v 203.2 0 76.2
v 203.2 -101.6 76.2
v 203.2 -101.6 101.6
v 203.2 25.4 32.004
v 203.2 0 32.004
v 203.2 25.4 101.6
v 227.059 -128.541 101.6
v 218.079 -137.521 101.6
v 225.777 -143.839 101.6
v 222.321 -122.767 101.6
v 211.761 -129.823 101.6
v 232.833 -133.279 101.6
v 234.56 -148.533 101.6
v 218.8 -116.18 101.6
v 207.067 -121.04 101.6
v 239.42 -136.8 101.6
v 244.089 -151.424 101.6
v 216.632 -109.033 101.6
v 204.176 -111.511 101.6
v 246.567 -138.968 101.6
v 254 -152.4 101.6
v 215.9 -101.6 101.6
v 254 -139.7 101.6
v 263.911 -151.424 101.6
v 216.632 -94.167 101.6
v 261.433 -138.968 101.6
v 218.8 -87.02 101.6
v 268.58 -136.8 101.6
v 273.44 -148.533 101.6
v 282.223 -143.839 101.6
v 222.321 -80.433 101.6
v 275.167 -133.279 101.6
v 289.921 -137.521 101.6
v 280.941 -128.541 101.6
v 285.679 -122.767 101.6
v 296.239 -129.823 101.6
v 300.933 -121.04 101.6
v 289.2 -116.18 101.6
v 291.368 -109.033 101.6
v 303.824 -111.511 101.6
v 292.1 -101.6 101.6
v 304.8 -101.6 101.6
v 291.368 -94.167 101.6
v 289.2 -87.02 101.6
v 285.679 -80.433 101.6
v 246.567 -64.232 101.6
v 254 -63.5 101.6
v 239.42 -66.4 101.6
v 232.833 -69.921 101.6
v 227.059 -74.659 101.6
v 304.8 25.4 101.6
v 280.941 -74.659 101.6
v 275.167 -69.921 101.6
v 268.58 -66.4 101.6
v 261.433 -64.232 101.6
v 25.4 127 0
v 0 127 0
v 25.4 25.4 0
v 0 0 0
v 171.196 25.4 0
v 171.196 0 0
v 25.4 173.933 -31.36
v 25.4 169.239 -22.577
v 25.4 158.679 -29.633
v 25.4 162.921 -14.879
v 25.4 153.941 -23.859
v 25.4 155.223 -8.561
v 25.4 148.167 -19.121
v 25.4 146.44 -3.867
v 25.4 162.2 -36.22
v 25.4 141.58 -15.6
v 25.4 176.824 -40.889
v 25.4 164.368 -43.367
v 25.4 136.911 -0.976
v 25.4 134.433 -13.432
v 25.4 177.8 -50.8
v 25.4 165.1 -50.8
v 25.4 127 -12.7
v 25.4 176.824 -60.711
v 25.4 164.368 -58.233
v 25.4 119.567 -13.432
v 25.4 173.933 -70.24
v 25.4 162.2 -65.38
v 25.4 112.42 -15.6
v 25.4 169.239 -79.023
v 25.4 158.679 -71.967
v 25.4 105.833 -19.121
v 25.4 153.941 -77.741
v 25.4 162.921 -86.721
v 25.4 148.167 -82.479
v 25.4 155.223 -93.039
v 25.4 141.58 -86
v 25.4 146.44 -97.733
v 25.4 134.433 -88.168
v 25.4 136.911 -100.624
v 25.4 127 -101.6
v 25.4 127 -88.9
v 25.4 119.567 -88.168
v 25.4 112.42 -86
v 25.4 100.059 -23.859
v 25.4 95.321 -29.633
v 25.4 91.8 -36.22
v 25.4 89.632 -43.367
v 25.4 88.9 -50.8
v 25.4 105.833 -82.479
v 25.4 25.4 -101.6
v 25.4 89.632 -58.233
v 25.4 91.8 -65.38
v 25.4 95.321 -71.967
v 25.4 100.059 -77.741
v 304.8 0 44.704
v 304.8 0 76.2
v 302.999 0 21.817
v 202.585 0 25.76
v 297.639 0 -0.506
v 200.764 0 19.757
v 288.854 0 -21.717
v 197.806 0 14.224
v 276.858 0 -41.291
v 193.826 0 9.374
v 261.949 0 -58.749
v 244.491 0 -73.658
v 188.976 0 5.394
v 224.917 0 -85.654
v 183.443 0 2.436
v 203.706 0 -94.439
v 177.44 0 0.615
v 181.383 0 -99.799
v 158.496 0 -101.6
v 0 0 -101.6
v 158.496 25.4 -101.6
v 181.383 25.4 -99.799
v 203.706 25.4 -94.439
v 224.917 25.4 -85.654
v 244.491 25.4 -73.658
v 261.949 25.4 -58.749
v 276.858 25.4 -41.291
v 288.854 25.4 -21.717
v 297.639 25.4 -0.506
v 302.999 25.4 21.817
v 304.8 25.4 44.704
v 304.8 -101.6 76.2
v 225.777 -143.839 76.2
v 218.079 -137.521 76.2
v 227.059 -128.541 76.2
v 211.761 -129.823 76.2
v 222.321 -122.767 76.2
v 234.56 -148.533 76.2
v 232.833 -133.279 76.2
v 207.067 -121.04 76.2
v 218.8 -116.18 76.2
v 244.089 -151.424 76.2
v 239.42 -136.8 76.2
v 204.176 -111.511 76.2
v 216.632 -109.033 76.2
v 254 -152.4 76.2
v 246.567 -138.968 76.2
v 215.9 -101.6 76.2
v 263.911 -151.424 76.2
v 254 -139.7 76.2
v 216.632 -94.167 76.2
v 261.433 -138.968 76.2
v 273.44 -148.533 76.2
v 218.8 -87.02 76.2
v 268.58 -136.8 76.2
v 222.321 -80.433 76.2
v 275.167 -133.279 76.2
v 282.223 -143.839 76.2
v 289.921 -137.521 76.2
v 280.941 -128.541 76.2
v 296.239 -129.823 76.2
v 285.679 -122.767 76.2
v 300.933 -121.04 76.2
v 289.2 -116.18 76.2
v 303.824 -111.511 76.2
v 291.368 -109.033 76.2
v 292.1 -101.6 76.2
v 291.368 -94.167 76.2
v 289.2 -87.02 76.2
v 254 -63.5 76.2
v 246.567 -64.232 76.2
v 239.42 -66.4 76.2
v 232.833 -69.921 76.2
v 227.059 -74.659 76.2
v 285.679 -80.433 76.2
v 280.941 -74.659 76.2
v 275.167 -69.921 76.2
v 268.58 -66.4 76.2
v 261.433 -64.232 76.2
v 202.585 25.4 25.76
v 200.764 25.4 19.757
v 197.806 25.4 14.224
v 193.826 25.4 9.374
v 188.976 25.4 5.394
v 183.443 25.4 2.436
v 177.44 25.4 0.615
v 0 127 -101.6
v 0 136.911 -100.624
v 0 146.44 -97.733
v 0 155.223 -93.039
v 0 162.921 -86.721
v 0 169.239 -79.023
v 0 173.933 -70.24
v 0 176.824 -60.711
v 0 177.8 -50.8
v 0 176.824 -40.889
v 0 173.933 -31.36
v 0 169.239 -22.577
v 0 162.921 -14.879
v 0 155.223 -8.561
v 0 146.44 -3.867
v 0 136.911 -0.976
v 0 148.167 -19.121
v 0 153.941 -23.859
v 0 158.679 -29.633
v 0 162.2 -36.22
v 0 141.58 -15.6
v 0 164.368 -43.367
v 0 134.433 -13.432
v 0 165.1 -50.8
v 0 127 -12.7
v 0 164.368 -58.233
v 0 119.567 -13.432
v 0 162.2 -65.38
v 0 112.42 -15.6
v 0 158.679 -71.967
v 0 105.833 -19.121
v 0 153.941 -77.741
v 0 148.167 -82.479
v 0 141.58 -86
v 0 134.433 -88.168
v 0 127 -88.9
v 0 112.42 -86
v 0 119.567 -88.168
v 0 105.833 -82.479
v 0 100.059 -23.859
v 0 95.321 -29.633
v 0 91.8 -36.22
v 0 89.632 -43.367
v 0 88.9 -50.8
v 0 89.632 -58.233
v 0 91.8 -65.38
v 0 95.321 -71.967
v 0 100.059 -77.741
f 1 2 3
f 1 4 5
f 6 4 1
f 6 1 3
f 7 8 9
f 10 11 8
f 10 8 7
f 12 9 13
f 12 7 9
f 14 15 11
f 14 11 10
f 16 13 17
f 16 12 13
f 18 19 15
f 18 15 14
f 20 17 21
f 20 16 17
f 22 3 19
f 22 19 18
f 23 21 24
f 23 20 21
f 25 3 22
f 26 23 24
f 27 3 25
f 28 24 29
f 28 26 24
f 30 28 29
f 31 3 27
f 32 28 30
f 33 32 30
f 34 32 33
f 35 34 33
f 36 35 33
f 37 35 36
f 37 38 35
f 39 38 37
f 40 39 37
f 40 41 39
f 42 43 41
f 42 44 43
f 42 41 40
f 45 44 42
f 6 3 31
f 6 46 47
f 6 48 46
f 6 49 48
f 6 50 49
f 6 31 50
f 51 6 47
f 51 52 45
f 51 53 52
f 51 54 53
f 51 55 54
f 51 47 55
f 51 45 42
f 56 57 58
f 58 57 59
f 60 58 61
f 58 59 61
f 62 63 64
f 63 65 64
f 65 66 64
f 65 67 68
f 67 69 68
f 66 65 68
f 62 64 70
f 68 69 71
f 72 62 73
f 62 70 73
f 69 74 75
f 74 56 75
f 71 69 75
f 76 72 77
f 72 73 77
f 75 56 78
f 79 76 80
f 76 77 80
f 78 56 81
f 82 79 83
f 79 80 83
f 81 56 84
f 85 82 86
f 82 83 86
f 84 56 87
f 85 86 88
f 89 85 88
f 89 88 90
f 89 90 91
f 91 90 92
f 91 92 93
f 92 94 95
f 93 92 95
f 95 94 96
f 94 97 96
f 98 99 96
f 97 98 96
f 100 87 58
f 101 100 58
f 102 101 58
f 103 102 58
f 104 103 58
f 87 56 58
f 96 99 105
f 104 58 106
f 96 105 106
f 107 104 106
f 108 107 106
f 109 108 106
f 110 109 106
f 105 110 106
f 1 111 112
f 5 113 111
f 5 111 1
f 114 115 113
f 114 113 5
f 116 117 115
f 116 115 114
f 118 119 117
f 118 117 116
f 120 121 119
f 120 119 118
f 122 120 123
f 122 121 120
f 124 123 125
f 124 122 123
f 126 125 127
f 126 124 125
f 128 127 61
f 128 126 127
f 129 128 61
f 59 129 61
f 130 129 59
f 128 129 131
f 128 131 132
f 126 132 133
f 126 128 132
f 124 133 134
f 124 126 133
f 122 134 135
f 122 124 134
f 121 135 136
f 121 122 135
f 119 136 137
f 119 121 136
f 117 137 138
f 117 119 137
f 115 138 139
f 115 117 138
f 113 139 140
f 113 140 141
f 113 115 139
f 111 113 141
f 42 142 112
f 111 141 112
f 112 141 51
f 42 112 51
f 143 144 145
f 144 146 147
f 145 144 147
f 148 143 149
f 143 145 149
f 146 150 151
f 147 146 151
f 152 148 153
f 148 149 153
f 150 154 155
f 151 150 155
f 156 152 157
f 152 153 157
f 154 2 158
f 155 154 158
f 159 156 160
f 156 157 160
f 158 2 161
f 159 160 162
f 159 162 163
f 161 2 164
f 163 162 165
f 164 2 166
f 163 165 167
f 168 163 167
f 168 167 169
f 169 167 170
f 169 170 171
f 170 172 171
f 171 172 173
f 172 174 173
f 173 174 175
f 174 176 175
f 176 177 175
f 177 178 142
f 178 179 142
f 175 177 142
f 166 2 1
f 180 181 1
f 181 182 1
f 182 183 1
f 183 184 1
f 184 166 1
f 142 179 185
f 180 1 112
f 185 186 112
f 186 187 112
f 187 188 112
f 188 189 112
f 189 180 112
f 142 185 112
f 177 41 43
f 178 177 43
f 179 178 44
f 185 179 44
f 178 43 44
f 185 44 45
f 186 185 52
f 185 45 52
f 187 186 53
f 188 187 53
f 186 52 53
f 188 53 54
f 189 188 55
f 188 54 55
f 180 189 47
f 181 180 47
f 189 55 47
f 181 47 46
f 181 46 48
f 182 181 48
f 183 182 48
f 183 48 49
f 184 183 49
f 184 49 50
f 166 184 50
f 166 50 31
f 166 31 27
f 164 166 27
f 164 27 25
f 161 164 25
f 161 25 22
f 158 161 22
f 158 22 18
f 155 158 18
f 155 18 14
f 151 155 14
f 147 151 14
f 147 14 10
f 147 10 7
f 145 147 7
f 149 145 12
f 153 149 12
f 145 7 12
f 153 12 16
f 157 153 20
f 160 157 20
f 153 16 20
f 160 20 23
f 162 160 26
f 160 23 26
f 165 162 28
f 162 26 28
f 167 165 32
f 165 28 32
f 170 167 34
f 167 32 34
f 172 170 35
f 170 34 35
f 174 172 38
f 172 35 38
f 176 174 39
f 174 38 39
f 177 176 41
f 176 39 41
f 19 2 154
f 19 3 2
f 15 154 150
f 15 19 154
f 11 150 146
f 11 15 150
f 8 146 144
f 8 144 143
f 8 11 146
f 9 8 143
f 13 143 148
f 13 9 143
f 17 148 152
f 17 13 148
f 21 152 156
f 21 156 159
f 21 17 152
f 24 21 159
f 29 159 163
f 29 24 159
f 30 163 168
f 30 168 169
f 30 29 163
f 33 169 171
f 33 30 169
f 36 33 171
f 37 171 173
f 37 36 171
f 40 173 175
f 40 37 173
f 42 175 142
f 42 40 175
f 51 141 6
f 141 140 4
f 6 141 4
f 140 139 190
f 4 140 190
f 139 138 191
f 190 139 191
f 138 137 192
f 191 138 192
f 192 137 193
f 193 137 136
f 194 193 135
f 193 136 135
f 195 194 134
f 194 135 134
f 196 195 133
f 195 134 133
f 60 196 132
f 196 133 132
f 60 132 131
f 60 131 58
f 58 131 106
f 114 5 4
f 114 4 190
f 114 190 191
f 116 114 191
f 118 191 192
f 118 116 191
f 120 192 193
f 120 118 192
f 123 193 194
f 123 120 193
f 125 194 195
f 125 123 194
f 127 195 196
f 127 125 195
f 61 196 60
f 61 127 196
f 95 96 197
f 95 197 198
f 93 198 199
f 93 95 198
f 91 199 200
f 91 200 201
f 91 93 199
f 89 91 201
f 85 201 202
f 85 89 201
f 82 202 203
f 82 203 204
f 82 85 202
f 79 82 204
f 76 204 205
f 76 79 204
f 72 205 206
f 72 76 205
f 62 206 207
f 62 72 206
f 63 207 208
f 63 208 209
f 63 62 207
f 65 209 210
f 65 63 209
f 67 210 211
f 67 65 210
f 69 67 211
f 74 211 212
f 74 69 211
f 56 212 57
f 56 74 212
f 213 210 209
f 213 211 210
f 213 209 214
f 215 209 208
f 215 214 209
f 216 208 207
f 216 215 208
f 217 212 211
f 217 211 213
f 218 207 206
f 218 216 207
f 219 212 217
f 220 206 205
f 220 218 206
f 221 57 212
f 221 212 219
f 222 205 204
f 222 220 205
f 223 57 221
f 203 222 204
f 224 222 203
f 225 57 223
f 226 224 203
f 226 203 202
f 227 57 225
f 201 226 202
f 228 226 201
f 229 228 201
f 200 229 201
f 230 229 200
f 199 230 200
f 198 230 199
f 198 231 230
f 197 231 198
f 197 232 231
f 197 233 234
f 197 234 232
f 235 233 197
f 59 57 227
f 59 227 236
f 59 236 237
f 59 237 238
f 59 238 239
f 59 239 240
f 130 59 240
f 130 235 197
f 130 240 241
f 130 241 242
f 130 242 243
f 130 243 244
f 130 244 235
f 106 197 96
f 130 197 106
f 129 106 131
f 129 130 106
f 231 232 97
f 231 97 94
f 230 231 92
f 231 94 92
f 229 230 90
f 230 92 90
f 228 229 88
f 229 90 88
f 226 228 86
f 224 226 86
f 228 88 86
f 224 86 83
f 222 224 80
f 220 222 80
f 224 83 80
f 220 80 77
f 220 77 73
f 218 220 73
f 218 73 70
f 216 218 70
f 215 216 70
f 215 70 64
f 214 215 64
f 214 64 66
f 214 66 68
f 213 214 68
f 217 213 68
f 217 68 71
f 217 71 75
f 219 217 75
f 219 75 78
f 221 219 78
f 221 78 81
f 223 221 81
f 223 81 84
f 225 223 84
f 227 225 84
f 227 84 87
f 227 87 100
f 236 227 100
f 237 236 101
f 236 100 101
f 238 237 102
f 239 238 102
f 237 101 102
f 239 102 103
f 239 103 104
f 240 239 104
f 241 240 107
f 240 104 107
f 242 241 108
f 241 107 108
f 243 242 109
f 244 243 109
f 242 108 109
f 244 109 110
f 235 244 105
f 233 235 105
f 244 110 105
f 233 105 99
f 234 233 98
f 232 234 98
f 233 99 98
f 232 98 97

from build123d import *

# Parameters (mm, degrees)
SALIENTE_EXTRUIR1_DEPTH = 25.4
CROQUIS2_W              = 101.6
CROQUIS2_H              = 25.4
SALIENTE_EXTRUIR2_DEPTH = 101.6
CROQUIS3_R              = 50.8
SALIENTE_EXTRUIR3_DEPTH = 25.4
CROQUIS4_R              = 38.1
CORTAR_EXTRUIR1_DEPTH   = 204.2
CROQUIS5_W              = 25.4
CROQUIS5_H              = 101.6
SALIENTE_EXTRUIR4_DEPTH = 101.6
CROQUIS6_R              = 50.8
SALIENTE_EXTRUIR5_DEPTH = 25.4
CROQUIS7_R              = 38.1
CORTAR_EXTRUIR3_DEPTH   = 26.4


with BuildPart() as part:
    # Croquis1 → Saliente-Extruir1 (new body)
    with BuildSketch(Plane(origin=(0, 0, 0), x_dir=(1, 0, 0), z_dir=(0, 1, 0))):
        with BuildLine():
            Line((0, 0), (0, 101.6))
            Line((0, 101.6), (158.496, 101.6))
            ThreePointArc((158.496, 101.6), (261.948550515, 58.748550515), (304.8, -44.704))
            Line((304.8, -44.704), (304.8, -101.6))
            Line((304.8, -101.6), (203.2, -101.6))
            Line((203.2, -101.6), (203.2, -32.004))
            ThreePointArc((203.2, -32.004), (193.826245425, -9.373754575), (171.196, 0))
            Line((171.196, 0), (0, 0))
        make_face()
    extrude(amount=SALIENTE_EXTRUIR1_DEPTH)

    # Croquis2 → Saliente-Extruir2 (add)
    with BuildSketch(Plane.XZ):
        with Locations((254, 88.9)):
            Rectangle(CROQUIS2_W, CROQUIS2_H)
    extrude(amount=SALIENTE_EXTRUIR2_DEPTH)

    # Croquis3 → Saliente-Extruir3 (add)
    with BuildSketch(Plane.XY.offset(101.6)):
        with Locations((254, -101.6)):
            Circle(CROQUIS3_R)
    extrude(amount=-SALIENTE_EXTRUIR3_DEPTH)

    # Croquis4 → Cortar-Extruir1 (cut, through all)
    with BuildSketch(Plane.XY.offset(101.6)):
        with Locations((254, -101.6)):
            Circle(CROQUIS4_R)
    extrude(amount=-CORTAR_EXTRUIR1_DEPTH, mode=Mode.SUBTRACT)

    # Croquis5 → Saliente-Extruir4 (add)
    with BuildSketch(Plane(origin=(0, 25.4, 0), x_dir=(1, 0, 0), z_dir=(0, 1, 0))):
        with Locations((12.7, 50.8)):
            Rectangle(CROQUIS5_W, CROQUIS5_H)
    extrude(amount=SALIENTE_EXTRUIR4_DEPTH)

    # Croquis6 → Saliente-Extruir5 (add)
    with BuildSketch(Plane(origin=(25.4, 0, 0), x_dir=(0, 0, -1), z_dir=(1, 0, 0))):
        with Locations((50.8, 127)):
            Circle(CROQUIS6_R)
    extrude(amount=-SALIENTE_EXTRUIR5_DEPTH)

    # Croquis7 → Cortar-Extruir3 (cut, through all)
    with BuildSketch(Plane(origin=(25.4, 0, 0), x_dir=(0, 0, -1), z_dir=(1, 0, 0))):
        with Locations((50.8, 127)):
            Circle(CROQUIS7_R)
    extrude(amount=-CORTAR_EXTRUIR3_DEPTH, mode=Mode.SUBTRACT)


solid = part.part
